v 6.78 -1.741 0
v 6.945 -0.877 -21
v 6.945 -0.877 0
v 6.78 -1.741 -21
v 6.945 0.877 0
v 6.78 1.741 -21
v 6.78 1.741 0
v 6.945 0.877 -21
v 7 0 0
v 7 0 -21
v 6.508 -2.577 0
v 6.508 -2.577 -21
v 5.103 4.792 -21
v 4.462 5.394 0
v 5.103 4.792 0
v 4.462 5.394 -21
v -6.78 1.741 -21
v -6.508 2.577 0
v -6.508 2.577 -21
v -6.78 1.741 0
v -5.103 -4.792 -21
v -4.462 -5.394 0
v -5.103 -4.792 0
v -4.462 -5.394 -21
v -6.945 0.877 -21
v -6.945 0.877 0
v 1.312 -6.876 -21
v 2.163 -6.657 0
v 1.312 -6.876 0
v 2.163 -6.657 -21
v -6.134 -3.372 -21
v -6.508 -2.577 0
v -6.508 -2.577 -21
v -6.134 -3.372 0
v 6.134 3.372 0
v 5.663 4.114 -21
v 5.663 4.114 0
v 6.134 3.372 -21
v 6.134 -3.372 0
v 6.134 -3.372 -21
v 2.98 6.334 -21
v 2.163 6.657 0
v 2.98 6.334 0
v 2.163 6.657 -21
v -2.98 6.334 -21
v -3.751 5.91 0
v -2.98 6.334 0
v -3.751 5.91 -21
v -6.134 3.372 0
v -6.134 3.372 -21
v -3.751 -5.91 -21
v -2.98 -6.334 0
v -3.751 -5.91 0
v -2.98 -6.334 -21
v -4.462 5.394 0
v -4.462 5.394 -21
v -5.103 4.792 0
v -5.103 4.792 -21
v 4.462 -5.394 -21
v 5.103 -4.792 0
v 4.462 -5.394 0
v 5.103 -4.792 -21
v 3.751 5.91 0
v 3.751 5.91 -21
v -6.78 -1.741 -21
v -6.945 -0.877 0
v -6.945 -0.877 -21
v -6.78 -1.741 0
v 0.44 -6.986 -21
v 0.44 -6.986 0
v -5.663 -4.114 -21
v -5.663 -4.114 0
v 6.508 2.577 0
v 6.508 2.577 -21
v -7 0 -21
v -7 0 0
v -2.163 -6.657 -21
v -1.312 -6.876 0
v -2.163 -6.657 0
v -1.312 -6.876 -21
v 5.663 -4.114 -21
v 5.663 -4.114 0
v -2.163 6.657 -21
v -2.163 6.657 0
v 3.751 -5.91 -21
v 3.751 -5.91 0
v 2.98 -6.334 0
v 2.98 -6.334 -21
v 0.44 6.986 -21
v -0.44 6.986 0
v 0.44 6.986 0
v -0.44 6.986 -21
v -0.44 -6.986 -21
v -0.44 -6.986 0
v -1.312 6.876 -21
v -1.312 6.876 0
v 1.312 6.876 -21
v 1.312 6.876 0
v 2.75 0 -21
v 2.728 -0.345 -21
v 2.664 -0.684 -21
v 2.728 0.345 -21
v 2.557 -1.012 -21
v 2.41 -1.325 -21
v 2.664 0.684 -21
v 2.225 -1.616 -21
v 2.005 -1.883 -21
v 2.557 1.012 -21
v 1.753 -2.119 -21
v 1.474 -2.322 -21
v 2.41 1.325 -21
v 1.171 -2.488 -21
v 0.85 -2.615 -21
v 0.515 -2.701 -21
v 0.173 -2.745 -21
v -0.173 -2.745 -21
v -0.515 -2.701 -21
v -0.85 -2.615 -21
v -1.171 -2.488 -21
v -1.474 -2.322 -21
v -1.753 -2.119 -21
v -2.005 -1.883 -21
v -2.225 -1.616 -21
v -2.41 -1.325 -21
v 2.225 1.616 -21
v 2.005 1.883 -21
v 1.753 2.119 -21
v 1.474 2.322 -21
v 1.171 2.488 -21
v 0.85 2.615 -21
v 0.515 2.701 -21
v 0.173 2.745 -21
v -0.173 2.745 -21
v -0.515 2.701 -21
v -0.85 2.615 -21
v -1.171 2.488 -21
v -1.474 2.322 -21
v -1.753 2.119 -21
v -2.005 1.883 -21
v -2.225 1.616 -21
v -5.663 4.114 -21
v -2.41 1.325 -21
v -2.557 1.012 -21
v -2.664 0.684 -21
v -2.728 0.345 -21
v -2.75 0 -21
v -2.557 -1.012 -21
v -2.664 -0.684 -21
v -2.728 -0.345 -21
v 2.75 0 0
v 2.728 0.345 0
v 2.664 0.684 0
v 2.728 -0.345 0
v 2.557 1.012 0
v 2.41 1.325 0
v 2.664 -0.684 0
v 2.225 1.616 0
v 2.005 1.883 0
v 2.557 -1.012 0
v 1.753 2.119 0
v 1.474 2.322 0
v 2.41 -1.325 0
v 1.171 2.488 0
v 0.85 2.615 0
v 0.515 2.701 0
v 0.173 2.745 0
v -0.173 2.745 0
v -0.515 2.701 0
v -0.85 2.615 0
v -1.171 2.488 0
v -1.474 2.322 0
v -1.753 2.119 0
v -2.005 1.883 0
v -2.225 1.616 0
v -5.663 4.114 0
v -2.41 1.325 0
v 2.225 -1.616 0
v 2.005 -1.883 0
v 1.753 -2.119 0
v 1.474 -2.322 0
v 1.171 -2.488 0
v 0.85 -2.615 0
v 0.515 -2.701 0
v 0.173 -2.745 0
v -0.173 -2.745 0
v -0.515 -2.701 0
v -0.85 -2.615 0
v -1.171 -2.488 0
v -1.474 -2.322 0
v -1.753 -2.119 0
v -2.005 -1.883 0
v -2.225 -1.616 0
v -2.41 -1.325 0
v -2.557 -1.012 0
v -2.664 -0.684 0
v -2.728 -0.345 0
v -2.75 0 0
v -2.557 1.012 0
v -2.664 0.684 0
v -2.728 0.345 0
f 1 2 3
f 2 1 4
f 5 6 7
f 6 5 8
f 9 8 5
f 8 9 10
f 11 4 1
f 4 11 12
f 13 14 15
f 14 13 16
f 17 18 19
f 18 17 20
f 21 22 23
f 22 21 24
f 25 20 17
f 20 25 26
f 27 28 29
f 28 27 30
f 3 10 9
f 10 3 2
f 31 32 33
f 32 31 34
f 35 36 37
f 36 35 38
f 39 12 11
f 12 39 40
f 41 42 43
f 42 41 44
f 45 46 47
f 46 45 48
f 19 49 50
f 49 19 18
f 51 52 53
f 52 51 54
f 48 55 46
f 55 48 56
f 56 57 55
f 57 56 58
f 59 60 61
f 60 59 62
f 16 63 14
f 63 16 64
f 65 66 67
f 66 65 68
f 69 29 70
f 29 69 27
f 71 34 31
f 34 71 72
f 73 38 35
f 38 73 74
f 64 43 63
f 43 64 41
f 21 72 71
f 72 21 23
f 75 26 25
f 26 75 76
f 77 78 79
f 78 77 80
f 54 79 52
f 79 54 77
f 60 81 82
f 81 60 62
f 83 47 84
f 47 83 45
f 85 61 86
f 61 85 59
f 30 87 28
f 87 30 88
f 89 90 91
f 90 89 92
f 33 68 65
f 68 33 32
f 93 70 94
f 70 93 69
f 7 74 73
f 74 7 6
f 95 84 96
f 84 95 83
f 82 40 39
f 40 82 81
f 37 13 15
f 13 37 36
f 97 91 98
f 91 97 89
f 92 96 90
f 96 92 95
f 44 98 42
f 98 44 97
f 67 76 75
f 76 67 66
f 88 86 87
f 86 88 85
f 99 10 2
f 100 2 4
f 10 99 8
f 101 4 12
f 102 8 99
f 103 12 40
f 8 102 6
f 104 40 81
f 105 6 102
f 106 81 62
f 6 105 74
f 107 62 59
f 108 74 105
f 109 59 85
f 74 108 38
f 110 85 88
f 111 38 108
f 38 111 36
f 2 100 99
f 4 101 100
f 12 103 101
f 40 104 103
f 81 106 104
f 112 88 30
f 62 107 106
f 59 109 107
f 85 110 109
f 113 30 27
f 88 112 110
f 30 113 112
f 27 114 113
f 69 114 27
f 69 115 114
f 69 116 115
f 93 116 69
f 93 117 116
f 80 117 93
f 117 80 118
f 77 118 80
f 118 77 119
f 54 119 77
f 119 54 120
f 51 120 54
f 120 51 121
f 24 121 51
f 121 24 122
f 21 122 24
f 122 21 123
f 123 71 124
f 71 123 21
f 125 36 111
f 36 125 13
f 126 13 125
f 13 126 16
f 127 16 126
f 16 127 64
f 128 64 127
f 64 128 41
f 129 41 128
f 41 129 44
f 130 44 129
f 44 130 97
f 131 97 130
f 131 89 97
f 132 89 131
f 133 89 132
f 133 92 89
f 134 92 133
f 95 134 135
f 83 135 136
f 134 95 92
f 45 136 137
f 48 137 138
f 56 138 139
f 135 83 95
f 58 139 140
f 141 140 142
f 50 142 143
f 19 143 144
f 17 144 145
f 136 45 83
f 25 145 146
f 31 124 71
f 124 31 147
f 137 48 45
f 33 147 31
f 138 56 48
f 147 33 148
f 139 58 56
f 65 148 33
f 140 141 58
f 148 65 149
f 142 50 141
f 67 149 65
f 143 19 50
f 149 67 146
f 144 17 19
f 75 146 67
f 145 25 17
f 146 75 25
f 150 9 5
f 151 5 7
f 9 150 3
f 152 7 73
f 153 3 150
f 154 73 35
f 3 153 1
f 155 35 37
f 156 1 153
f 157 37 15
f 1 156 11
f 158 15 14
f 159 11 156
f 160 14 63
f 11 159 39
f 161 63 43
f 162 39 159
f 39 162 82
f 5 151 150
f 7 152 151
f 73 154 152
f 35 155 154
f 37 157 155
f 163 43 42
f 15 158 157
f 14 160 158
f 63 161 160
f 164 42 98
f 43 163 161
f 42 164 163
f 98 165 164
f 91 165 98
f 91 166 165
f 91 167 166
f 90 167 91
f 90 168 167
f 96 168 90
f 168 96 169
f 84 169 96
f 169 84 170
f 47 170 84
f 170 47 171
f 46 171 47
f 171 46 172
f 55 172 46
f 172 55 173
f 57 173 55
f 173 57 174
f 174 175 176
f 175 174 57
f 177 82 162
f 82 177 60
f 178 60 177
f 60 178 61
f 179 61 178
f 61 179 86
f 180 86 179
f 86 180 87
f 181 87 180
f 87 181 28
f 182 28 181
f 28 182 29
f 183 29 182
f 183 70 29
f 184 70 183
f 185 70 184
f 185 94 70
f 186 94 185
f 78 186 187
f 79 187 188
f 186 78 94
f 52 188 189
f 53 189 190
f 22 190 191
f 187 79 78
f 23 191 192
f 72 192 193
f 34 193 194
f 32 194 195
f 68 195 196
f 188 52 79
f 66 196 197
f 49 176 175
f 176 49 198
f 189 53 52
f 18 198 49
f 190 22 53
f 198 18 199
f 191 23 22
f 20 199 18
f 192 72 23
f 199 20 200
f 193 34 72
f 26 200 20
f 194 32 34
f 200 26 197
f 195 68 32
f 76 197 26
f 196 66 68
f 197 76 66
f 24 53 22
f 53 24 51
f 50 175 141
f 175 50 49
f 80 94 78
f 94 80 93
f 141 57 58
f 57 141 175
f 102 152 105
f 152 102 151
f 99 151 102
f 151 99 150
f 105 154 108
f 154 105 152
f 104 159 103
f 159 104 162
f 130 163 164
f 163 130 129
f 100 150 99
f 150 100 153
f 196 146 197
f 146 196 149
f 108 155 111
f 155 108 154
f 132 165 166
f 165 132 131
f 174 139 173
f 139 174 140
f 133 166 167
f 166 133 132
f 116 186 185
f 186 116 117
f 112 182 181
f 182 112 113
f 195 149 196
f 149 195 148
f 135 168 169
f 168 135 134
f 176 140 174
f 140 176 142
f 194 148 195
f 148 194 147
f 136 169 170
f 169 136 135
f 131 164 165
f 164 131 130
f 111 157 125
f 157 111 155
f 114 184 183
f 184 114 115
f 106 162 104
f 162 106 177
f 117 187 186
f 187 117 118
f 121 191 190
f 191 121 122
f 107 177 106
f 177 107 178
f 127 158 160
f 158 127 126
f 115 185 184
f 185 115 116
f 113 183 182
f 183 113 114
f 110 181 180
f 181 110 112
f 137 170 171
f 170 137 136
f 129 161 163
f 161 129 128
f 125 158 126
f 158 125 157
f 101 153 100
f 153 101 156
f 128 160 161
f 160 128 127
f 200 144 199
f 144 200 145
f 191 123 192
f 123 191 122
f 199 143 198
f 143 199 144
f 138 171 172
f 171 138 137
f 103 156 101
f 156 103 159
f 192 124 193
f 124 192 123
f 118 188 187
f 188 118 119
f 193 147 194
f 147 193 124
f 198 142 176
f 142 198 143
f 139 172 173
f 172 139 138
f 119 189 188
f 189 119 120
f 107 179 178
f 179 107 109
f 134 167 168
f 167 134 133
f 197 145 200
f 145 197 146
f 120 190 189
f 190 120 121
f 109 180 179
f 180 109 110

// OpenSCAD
$fn = 50;


difference() {
	union() {
		translate(v = [0, 0, -21.0000000000]) {
			cylinder(h = 21, r = 7.0000000000);
		}
		cylinder(h = 0, r = 13.0000000000);
	}
	union() {
		#translate(v = [0, 0, -21]) {
			cylinder(h = 21, r = 2.7500000000);
		}
	}
}
